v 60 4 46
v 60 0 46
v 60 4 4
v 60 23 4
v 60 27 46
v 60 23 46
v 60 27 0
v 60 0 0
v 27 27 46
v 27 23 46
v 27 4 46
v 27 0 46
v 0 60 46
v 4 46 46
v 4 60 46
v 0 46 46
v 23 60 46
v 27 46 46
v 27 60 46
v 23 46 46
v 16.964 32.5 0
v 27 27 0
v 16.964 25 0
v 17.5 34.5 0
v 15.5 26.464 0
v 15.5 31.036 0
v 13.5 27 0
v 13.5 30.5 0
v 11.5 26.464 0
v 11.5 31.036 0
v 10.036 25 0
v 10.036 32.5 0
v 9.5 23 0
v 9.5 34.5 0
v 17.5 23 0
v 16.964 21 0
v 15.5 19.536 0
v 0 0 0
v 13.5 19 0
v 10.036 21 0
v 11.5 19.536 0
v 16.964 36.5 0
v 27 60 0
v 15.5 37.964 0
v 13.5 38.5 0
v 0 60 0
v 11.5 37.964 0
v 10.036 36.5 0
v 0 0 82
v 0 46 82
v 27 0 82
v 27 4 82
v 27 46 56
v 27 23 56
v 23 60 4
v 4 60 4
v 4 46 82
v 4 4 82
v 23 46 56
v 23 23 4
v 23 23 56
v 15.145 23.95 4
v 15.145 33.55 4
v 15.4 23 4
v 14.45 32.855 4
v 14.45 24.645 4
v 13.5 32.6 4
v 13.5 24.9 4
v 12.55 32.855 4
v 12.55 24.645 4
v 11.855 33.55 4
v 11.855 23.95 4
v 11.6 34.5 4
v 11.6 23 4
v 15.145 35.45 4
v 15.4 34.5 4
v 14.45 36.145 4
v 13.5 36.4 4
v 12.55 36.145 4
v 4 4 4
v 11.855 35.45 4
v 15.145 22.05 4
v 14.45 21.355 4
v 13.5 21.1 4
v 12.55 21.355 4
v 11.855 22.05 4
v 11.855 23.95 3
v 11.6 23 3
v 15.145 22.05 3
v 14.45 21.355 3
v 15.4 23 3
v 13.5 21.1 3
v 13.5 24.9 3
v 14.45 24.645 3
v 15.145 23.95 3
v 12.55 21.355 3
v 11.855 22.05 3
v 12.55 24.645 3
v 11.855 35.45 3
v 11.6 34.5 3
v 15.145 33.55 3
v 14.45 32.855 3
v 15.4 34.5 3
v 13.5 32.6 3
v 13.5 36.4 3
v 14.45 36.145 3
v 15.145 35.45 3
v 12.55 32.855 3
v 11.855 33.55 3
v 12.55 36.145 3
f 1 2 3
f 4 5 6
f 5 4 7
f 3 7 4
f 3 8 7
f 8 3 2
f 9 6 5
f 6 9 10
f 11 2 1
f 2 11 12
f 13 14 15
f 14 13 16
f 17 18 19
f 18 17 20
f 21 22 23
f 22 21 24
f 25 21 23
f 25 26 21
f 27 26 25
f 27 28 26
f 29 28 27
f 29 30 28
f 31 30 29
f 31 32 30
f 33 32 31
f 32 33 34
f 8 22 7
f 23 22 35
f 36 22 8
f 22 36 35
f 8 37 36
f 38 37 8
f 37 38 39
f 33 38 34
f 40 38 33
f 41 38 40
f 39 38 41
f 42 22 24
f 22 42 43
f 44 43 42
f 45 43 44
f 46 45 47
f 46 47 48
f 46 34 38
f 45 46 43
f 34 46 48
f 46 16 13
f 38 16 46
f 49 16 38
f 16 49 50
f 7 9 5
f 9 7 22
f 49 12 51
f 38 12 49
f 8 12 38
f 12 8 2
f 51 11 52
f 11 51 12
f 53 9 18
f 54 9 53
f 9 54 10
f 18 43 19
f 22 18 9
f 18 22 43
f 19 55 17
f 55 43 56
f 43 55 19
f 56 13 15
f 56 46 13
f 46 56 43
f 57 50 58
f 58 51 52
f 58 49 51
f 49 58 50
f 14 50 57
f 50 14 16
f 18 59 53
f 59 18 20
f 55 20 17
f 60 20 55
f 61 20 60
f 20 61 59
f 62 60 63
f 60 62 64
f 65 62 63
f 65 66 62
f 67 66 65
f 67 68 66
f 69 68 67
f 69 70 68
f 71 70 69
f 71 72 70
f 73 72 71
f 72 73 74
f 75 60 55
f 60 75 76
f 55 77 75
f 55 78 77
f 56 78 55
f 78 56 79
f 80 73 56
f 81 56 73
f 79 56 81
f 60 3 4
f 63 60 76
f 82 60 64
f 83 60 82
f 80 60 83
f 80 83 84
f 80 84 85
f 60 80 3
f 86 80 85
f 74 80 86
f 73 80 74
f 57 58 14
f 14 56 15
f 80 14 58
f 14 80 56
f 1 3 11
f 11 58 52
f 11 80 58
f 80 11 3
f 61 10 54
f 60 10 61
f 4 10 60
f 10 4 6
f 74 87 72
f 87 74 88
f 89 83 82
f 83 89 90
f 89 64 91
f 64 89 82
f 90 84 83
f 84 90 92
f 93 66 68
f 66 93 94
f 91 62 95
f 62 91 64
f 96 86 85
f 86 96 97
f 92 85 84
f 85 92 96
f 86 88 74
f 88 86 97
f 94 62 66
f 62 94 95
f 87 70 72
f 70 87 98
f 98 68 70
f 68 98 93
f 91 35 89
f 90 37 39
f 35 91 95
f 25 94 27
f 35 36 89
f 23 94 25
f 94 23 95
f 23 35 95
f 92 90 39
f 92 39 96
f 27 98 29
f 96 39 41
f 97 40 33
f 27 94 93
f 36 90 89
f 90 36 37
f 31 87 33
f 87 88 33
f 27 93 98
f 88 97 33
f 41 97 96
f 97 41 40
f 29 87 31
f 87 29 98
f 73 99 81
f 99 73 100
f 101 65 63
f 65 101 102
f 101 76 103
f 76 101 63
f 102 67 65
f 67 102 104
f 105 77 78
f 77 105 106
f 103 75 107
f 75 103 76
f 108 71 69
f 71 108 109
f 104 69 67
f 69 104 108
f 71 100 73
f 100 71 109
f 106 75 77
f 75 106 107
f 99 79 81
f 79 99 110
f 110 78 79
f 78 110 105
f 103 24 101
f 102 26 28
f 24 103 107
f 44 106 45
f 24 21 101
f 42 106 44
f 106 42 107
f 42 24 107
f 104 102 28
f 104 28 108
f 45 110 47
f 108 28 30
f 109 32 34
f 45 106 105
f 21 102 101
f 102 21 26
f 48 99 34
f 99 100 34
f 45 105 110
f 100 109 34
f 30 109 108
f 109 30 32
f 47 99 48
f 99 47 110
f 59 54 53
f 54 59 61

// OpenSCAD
difference(){
	union() {
		cube(size = [60, 27, 46]);
		cube(size = [27, 60, 46]);
		translate(v = [0, 0, 42]) {
			cube(size = [27, 46, 40]);
		}
		translate(v = [13.5000000000, 23.0000000000, 0]) {
			rotate(a = 180, v = [1, 0, 0]) {
			}
		}
		translate(v = [13.5000000000, 34.5000000000, 0]) {
			rotate(a = 180, v = [1, 0, 0]) {
			}
		}
	}
	/* Holes Below*/
	union(){
		translate(v = [4, 4, 4]) {
			cube(size = [19, 60, 1000]);
			cube(size = [60, 19, 1000]);
		}
		translate(v = [4, 4, 56]) {
			cube(size = [1000, 1000, 1000]);
		}
		translate(v = [13.5000000000, 23.0000000000, 0]){
			rotate(a = 180, v = [1, 0, 0]){
				union() {
					union() {
						translate(v = [0, 0, -5]) {
							cylinder($fn = 12, h = 5, r = 1.9000000000);
						}
						translate(v = [0, 0, -3]) {
							cylinder($fn = 12, h = 3, r1 = 1.9000000000, r2 = 4);
						}
					}
					cylinder($fn = 12, h = 1, r = 4);
				}
			}
		}
		translate(v = [13.5000000000, 34.5000000000, 0]){
			rotate(a = 180, v = [1, 0, 0]){
				union() {
					union() {
						translate(v = [0, 0, -5]) {
							cylinder($fn = 12, h = 5, r = 1.9000000000);
						}
						translate(v = [0, 0, -3]) {
							cylinder($fn = 12, h = 3, r1 = 1.9000000000, r2 = 4);
						}
					}
					cylinder($fn = 12, h = 1, r = 4);
				}
			}
		}
	} /* End Holes */ 
}
